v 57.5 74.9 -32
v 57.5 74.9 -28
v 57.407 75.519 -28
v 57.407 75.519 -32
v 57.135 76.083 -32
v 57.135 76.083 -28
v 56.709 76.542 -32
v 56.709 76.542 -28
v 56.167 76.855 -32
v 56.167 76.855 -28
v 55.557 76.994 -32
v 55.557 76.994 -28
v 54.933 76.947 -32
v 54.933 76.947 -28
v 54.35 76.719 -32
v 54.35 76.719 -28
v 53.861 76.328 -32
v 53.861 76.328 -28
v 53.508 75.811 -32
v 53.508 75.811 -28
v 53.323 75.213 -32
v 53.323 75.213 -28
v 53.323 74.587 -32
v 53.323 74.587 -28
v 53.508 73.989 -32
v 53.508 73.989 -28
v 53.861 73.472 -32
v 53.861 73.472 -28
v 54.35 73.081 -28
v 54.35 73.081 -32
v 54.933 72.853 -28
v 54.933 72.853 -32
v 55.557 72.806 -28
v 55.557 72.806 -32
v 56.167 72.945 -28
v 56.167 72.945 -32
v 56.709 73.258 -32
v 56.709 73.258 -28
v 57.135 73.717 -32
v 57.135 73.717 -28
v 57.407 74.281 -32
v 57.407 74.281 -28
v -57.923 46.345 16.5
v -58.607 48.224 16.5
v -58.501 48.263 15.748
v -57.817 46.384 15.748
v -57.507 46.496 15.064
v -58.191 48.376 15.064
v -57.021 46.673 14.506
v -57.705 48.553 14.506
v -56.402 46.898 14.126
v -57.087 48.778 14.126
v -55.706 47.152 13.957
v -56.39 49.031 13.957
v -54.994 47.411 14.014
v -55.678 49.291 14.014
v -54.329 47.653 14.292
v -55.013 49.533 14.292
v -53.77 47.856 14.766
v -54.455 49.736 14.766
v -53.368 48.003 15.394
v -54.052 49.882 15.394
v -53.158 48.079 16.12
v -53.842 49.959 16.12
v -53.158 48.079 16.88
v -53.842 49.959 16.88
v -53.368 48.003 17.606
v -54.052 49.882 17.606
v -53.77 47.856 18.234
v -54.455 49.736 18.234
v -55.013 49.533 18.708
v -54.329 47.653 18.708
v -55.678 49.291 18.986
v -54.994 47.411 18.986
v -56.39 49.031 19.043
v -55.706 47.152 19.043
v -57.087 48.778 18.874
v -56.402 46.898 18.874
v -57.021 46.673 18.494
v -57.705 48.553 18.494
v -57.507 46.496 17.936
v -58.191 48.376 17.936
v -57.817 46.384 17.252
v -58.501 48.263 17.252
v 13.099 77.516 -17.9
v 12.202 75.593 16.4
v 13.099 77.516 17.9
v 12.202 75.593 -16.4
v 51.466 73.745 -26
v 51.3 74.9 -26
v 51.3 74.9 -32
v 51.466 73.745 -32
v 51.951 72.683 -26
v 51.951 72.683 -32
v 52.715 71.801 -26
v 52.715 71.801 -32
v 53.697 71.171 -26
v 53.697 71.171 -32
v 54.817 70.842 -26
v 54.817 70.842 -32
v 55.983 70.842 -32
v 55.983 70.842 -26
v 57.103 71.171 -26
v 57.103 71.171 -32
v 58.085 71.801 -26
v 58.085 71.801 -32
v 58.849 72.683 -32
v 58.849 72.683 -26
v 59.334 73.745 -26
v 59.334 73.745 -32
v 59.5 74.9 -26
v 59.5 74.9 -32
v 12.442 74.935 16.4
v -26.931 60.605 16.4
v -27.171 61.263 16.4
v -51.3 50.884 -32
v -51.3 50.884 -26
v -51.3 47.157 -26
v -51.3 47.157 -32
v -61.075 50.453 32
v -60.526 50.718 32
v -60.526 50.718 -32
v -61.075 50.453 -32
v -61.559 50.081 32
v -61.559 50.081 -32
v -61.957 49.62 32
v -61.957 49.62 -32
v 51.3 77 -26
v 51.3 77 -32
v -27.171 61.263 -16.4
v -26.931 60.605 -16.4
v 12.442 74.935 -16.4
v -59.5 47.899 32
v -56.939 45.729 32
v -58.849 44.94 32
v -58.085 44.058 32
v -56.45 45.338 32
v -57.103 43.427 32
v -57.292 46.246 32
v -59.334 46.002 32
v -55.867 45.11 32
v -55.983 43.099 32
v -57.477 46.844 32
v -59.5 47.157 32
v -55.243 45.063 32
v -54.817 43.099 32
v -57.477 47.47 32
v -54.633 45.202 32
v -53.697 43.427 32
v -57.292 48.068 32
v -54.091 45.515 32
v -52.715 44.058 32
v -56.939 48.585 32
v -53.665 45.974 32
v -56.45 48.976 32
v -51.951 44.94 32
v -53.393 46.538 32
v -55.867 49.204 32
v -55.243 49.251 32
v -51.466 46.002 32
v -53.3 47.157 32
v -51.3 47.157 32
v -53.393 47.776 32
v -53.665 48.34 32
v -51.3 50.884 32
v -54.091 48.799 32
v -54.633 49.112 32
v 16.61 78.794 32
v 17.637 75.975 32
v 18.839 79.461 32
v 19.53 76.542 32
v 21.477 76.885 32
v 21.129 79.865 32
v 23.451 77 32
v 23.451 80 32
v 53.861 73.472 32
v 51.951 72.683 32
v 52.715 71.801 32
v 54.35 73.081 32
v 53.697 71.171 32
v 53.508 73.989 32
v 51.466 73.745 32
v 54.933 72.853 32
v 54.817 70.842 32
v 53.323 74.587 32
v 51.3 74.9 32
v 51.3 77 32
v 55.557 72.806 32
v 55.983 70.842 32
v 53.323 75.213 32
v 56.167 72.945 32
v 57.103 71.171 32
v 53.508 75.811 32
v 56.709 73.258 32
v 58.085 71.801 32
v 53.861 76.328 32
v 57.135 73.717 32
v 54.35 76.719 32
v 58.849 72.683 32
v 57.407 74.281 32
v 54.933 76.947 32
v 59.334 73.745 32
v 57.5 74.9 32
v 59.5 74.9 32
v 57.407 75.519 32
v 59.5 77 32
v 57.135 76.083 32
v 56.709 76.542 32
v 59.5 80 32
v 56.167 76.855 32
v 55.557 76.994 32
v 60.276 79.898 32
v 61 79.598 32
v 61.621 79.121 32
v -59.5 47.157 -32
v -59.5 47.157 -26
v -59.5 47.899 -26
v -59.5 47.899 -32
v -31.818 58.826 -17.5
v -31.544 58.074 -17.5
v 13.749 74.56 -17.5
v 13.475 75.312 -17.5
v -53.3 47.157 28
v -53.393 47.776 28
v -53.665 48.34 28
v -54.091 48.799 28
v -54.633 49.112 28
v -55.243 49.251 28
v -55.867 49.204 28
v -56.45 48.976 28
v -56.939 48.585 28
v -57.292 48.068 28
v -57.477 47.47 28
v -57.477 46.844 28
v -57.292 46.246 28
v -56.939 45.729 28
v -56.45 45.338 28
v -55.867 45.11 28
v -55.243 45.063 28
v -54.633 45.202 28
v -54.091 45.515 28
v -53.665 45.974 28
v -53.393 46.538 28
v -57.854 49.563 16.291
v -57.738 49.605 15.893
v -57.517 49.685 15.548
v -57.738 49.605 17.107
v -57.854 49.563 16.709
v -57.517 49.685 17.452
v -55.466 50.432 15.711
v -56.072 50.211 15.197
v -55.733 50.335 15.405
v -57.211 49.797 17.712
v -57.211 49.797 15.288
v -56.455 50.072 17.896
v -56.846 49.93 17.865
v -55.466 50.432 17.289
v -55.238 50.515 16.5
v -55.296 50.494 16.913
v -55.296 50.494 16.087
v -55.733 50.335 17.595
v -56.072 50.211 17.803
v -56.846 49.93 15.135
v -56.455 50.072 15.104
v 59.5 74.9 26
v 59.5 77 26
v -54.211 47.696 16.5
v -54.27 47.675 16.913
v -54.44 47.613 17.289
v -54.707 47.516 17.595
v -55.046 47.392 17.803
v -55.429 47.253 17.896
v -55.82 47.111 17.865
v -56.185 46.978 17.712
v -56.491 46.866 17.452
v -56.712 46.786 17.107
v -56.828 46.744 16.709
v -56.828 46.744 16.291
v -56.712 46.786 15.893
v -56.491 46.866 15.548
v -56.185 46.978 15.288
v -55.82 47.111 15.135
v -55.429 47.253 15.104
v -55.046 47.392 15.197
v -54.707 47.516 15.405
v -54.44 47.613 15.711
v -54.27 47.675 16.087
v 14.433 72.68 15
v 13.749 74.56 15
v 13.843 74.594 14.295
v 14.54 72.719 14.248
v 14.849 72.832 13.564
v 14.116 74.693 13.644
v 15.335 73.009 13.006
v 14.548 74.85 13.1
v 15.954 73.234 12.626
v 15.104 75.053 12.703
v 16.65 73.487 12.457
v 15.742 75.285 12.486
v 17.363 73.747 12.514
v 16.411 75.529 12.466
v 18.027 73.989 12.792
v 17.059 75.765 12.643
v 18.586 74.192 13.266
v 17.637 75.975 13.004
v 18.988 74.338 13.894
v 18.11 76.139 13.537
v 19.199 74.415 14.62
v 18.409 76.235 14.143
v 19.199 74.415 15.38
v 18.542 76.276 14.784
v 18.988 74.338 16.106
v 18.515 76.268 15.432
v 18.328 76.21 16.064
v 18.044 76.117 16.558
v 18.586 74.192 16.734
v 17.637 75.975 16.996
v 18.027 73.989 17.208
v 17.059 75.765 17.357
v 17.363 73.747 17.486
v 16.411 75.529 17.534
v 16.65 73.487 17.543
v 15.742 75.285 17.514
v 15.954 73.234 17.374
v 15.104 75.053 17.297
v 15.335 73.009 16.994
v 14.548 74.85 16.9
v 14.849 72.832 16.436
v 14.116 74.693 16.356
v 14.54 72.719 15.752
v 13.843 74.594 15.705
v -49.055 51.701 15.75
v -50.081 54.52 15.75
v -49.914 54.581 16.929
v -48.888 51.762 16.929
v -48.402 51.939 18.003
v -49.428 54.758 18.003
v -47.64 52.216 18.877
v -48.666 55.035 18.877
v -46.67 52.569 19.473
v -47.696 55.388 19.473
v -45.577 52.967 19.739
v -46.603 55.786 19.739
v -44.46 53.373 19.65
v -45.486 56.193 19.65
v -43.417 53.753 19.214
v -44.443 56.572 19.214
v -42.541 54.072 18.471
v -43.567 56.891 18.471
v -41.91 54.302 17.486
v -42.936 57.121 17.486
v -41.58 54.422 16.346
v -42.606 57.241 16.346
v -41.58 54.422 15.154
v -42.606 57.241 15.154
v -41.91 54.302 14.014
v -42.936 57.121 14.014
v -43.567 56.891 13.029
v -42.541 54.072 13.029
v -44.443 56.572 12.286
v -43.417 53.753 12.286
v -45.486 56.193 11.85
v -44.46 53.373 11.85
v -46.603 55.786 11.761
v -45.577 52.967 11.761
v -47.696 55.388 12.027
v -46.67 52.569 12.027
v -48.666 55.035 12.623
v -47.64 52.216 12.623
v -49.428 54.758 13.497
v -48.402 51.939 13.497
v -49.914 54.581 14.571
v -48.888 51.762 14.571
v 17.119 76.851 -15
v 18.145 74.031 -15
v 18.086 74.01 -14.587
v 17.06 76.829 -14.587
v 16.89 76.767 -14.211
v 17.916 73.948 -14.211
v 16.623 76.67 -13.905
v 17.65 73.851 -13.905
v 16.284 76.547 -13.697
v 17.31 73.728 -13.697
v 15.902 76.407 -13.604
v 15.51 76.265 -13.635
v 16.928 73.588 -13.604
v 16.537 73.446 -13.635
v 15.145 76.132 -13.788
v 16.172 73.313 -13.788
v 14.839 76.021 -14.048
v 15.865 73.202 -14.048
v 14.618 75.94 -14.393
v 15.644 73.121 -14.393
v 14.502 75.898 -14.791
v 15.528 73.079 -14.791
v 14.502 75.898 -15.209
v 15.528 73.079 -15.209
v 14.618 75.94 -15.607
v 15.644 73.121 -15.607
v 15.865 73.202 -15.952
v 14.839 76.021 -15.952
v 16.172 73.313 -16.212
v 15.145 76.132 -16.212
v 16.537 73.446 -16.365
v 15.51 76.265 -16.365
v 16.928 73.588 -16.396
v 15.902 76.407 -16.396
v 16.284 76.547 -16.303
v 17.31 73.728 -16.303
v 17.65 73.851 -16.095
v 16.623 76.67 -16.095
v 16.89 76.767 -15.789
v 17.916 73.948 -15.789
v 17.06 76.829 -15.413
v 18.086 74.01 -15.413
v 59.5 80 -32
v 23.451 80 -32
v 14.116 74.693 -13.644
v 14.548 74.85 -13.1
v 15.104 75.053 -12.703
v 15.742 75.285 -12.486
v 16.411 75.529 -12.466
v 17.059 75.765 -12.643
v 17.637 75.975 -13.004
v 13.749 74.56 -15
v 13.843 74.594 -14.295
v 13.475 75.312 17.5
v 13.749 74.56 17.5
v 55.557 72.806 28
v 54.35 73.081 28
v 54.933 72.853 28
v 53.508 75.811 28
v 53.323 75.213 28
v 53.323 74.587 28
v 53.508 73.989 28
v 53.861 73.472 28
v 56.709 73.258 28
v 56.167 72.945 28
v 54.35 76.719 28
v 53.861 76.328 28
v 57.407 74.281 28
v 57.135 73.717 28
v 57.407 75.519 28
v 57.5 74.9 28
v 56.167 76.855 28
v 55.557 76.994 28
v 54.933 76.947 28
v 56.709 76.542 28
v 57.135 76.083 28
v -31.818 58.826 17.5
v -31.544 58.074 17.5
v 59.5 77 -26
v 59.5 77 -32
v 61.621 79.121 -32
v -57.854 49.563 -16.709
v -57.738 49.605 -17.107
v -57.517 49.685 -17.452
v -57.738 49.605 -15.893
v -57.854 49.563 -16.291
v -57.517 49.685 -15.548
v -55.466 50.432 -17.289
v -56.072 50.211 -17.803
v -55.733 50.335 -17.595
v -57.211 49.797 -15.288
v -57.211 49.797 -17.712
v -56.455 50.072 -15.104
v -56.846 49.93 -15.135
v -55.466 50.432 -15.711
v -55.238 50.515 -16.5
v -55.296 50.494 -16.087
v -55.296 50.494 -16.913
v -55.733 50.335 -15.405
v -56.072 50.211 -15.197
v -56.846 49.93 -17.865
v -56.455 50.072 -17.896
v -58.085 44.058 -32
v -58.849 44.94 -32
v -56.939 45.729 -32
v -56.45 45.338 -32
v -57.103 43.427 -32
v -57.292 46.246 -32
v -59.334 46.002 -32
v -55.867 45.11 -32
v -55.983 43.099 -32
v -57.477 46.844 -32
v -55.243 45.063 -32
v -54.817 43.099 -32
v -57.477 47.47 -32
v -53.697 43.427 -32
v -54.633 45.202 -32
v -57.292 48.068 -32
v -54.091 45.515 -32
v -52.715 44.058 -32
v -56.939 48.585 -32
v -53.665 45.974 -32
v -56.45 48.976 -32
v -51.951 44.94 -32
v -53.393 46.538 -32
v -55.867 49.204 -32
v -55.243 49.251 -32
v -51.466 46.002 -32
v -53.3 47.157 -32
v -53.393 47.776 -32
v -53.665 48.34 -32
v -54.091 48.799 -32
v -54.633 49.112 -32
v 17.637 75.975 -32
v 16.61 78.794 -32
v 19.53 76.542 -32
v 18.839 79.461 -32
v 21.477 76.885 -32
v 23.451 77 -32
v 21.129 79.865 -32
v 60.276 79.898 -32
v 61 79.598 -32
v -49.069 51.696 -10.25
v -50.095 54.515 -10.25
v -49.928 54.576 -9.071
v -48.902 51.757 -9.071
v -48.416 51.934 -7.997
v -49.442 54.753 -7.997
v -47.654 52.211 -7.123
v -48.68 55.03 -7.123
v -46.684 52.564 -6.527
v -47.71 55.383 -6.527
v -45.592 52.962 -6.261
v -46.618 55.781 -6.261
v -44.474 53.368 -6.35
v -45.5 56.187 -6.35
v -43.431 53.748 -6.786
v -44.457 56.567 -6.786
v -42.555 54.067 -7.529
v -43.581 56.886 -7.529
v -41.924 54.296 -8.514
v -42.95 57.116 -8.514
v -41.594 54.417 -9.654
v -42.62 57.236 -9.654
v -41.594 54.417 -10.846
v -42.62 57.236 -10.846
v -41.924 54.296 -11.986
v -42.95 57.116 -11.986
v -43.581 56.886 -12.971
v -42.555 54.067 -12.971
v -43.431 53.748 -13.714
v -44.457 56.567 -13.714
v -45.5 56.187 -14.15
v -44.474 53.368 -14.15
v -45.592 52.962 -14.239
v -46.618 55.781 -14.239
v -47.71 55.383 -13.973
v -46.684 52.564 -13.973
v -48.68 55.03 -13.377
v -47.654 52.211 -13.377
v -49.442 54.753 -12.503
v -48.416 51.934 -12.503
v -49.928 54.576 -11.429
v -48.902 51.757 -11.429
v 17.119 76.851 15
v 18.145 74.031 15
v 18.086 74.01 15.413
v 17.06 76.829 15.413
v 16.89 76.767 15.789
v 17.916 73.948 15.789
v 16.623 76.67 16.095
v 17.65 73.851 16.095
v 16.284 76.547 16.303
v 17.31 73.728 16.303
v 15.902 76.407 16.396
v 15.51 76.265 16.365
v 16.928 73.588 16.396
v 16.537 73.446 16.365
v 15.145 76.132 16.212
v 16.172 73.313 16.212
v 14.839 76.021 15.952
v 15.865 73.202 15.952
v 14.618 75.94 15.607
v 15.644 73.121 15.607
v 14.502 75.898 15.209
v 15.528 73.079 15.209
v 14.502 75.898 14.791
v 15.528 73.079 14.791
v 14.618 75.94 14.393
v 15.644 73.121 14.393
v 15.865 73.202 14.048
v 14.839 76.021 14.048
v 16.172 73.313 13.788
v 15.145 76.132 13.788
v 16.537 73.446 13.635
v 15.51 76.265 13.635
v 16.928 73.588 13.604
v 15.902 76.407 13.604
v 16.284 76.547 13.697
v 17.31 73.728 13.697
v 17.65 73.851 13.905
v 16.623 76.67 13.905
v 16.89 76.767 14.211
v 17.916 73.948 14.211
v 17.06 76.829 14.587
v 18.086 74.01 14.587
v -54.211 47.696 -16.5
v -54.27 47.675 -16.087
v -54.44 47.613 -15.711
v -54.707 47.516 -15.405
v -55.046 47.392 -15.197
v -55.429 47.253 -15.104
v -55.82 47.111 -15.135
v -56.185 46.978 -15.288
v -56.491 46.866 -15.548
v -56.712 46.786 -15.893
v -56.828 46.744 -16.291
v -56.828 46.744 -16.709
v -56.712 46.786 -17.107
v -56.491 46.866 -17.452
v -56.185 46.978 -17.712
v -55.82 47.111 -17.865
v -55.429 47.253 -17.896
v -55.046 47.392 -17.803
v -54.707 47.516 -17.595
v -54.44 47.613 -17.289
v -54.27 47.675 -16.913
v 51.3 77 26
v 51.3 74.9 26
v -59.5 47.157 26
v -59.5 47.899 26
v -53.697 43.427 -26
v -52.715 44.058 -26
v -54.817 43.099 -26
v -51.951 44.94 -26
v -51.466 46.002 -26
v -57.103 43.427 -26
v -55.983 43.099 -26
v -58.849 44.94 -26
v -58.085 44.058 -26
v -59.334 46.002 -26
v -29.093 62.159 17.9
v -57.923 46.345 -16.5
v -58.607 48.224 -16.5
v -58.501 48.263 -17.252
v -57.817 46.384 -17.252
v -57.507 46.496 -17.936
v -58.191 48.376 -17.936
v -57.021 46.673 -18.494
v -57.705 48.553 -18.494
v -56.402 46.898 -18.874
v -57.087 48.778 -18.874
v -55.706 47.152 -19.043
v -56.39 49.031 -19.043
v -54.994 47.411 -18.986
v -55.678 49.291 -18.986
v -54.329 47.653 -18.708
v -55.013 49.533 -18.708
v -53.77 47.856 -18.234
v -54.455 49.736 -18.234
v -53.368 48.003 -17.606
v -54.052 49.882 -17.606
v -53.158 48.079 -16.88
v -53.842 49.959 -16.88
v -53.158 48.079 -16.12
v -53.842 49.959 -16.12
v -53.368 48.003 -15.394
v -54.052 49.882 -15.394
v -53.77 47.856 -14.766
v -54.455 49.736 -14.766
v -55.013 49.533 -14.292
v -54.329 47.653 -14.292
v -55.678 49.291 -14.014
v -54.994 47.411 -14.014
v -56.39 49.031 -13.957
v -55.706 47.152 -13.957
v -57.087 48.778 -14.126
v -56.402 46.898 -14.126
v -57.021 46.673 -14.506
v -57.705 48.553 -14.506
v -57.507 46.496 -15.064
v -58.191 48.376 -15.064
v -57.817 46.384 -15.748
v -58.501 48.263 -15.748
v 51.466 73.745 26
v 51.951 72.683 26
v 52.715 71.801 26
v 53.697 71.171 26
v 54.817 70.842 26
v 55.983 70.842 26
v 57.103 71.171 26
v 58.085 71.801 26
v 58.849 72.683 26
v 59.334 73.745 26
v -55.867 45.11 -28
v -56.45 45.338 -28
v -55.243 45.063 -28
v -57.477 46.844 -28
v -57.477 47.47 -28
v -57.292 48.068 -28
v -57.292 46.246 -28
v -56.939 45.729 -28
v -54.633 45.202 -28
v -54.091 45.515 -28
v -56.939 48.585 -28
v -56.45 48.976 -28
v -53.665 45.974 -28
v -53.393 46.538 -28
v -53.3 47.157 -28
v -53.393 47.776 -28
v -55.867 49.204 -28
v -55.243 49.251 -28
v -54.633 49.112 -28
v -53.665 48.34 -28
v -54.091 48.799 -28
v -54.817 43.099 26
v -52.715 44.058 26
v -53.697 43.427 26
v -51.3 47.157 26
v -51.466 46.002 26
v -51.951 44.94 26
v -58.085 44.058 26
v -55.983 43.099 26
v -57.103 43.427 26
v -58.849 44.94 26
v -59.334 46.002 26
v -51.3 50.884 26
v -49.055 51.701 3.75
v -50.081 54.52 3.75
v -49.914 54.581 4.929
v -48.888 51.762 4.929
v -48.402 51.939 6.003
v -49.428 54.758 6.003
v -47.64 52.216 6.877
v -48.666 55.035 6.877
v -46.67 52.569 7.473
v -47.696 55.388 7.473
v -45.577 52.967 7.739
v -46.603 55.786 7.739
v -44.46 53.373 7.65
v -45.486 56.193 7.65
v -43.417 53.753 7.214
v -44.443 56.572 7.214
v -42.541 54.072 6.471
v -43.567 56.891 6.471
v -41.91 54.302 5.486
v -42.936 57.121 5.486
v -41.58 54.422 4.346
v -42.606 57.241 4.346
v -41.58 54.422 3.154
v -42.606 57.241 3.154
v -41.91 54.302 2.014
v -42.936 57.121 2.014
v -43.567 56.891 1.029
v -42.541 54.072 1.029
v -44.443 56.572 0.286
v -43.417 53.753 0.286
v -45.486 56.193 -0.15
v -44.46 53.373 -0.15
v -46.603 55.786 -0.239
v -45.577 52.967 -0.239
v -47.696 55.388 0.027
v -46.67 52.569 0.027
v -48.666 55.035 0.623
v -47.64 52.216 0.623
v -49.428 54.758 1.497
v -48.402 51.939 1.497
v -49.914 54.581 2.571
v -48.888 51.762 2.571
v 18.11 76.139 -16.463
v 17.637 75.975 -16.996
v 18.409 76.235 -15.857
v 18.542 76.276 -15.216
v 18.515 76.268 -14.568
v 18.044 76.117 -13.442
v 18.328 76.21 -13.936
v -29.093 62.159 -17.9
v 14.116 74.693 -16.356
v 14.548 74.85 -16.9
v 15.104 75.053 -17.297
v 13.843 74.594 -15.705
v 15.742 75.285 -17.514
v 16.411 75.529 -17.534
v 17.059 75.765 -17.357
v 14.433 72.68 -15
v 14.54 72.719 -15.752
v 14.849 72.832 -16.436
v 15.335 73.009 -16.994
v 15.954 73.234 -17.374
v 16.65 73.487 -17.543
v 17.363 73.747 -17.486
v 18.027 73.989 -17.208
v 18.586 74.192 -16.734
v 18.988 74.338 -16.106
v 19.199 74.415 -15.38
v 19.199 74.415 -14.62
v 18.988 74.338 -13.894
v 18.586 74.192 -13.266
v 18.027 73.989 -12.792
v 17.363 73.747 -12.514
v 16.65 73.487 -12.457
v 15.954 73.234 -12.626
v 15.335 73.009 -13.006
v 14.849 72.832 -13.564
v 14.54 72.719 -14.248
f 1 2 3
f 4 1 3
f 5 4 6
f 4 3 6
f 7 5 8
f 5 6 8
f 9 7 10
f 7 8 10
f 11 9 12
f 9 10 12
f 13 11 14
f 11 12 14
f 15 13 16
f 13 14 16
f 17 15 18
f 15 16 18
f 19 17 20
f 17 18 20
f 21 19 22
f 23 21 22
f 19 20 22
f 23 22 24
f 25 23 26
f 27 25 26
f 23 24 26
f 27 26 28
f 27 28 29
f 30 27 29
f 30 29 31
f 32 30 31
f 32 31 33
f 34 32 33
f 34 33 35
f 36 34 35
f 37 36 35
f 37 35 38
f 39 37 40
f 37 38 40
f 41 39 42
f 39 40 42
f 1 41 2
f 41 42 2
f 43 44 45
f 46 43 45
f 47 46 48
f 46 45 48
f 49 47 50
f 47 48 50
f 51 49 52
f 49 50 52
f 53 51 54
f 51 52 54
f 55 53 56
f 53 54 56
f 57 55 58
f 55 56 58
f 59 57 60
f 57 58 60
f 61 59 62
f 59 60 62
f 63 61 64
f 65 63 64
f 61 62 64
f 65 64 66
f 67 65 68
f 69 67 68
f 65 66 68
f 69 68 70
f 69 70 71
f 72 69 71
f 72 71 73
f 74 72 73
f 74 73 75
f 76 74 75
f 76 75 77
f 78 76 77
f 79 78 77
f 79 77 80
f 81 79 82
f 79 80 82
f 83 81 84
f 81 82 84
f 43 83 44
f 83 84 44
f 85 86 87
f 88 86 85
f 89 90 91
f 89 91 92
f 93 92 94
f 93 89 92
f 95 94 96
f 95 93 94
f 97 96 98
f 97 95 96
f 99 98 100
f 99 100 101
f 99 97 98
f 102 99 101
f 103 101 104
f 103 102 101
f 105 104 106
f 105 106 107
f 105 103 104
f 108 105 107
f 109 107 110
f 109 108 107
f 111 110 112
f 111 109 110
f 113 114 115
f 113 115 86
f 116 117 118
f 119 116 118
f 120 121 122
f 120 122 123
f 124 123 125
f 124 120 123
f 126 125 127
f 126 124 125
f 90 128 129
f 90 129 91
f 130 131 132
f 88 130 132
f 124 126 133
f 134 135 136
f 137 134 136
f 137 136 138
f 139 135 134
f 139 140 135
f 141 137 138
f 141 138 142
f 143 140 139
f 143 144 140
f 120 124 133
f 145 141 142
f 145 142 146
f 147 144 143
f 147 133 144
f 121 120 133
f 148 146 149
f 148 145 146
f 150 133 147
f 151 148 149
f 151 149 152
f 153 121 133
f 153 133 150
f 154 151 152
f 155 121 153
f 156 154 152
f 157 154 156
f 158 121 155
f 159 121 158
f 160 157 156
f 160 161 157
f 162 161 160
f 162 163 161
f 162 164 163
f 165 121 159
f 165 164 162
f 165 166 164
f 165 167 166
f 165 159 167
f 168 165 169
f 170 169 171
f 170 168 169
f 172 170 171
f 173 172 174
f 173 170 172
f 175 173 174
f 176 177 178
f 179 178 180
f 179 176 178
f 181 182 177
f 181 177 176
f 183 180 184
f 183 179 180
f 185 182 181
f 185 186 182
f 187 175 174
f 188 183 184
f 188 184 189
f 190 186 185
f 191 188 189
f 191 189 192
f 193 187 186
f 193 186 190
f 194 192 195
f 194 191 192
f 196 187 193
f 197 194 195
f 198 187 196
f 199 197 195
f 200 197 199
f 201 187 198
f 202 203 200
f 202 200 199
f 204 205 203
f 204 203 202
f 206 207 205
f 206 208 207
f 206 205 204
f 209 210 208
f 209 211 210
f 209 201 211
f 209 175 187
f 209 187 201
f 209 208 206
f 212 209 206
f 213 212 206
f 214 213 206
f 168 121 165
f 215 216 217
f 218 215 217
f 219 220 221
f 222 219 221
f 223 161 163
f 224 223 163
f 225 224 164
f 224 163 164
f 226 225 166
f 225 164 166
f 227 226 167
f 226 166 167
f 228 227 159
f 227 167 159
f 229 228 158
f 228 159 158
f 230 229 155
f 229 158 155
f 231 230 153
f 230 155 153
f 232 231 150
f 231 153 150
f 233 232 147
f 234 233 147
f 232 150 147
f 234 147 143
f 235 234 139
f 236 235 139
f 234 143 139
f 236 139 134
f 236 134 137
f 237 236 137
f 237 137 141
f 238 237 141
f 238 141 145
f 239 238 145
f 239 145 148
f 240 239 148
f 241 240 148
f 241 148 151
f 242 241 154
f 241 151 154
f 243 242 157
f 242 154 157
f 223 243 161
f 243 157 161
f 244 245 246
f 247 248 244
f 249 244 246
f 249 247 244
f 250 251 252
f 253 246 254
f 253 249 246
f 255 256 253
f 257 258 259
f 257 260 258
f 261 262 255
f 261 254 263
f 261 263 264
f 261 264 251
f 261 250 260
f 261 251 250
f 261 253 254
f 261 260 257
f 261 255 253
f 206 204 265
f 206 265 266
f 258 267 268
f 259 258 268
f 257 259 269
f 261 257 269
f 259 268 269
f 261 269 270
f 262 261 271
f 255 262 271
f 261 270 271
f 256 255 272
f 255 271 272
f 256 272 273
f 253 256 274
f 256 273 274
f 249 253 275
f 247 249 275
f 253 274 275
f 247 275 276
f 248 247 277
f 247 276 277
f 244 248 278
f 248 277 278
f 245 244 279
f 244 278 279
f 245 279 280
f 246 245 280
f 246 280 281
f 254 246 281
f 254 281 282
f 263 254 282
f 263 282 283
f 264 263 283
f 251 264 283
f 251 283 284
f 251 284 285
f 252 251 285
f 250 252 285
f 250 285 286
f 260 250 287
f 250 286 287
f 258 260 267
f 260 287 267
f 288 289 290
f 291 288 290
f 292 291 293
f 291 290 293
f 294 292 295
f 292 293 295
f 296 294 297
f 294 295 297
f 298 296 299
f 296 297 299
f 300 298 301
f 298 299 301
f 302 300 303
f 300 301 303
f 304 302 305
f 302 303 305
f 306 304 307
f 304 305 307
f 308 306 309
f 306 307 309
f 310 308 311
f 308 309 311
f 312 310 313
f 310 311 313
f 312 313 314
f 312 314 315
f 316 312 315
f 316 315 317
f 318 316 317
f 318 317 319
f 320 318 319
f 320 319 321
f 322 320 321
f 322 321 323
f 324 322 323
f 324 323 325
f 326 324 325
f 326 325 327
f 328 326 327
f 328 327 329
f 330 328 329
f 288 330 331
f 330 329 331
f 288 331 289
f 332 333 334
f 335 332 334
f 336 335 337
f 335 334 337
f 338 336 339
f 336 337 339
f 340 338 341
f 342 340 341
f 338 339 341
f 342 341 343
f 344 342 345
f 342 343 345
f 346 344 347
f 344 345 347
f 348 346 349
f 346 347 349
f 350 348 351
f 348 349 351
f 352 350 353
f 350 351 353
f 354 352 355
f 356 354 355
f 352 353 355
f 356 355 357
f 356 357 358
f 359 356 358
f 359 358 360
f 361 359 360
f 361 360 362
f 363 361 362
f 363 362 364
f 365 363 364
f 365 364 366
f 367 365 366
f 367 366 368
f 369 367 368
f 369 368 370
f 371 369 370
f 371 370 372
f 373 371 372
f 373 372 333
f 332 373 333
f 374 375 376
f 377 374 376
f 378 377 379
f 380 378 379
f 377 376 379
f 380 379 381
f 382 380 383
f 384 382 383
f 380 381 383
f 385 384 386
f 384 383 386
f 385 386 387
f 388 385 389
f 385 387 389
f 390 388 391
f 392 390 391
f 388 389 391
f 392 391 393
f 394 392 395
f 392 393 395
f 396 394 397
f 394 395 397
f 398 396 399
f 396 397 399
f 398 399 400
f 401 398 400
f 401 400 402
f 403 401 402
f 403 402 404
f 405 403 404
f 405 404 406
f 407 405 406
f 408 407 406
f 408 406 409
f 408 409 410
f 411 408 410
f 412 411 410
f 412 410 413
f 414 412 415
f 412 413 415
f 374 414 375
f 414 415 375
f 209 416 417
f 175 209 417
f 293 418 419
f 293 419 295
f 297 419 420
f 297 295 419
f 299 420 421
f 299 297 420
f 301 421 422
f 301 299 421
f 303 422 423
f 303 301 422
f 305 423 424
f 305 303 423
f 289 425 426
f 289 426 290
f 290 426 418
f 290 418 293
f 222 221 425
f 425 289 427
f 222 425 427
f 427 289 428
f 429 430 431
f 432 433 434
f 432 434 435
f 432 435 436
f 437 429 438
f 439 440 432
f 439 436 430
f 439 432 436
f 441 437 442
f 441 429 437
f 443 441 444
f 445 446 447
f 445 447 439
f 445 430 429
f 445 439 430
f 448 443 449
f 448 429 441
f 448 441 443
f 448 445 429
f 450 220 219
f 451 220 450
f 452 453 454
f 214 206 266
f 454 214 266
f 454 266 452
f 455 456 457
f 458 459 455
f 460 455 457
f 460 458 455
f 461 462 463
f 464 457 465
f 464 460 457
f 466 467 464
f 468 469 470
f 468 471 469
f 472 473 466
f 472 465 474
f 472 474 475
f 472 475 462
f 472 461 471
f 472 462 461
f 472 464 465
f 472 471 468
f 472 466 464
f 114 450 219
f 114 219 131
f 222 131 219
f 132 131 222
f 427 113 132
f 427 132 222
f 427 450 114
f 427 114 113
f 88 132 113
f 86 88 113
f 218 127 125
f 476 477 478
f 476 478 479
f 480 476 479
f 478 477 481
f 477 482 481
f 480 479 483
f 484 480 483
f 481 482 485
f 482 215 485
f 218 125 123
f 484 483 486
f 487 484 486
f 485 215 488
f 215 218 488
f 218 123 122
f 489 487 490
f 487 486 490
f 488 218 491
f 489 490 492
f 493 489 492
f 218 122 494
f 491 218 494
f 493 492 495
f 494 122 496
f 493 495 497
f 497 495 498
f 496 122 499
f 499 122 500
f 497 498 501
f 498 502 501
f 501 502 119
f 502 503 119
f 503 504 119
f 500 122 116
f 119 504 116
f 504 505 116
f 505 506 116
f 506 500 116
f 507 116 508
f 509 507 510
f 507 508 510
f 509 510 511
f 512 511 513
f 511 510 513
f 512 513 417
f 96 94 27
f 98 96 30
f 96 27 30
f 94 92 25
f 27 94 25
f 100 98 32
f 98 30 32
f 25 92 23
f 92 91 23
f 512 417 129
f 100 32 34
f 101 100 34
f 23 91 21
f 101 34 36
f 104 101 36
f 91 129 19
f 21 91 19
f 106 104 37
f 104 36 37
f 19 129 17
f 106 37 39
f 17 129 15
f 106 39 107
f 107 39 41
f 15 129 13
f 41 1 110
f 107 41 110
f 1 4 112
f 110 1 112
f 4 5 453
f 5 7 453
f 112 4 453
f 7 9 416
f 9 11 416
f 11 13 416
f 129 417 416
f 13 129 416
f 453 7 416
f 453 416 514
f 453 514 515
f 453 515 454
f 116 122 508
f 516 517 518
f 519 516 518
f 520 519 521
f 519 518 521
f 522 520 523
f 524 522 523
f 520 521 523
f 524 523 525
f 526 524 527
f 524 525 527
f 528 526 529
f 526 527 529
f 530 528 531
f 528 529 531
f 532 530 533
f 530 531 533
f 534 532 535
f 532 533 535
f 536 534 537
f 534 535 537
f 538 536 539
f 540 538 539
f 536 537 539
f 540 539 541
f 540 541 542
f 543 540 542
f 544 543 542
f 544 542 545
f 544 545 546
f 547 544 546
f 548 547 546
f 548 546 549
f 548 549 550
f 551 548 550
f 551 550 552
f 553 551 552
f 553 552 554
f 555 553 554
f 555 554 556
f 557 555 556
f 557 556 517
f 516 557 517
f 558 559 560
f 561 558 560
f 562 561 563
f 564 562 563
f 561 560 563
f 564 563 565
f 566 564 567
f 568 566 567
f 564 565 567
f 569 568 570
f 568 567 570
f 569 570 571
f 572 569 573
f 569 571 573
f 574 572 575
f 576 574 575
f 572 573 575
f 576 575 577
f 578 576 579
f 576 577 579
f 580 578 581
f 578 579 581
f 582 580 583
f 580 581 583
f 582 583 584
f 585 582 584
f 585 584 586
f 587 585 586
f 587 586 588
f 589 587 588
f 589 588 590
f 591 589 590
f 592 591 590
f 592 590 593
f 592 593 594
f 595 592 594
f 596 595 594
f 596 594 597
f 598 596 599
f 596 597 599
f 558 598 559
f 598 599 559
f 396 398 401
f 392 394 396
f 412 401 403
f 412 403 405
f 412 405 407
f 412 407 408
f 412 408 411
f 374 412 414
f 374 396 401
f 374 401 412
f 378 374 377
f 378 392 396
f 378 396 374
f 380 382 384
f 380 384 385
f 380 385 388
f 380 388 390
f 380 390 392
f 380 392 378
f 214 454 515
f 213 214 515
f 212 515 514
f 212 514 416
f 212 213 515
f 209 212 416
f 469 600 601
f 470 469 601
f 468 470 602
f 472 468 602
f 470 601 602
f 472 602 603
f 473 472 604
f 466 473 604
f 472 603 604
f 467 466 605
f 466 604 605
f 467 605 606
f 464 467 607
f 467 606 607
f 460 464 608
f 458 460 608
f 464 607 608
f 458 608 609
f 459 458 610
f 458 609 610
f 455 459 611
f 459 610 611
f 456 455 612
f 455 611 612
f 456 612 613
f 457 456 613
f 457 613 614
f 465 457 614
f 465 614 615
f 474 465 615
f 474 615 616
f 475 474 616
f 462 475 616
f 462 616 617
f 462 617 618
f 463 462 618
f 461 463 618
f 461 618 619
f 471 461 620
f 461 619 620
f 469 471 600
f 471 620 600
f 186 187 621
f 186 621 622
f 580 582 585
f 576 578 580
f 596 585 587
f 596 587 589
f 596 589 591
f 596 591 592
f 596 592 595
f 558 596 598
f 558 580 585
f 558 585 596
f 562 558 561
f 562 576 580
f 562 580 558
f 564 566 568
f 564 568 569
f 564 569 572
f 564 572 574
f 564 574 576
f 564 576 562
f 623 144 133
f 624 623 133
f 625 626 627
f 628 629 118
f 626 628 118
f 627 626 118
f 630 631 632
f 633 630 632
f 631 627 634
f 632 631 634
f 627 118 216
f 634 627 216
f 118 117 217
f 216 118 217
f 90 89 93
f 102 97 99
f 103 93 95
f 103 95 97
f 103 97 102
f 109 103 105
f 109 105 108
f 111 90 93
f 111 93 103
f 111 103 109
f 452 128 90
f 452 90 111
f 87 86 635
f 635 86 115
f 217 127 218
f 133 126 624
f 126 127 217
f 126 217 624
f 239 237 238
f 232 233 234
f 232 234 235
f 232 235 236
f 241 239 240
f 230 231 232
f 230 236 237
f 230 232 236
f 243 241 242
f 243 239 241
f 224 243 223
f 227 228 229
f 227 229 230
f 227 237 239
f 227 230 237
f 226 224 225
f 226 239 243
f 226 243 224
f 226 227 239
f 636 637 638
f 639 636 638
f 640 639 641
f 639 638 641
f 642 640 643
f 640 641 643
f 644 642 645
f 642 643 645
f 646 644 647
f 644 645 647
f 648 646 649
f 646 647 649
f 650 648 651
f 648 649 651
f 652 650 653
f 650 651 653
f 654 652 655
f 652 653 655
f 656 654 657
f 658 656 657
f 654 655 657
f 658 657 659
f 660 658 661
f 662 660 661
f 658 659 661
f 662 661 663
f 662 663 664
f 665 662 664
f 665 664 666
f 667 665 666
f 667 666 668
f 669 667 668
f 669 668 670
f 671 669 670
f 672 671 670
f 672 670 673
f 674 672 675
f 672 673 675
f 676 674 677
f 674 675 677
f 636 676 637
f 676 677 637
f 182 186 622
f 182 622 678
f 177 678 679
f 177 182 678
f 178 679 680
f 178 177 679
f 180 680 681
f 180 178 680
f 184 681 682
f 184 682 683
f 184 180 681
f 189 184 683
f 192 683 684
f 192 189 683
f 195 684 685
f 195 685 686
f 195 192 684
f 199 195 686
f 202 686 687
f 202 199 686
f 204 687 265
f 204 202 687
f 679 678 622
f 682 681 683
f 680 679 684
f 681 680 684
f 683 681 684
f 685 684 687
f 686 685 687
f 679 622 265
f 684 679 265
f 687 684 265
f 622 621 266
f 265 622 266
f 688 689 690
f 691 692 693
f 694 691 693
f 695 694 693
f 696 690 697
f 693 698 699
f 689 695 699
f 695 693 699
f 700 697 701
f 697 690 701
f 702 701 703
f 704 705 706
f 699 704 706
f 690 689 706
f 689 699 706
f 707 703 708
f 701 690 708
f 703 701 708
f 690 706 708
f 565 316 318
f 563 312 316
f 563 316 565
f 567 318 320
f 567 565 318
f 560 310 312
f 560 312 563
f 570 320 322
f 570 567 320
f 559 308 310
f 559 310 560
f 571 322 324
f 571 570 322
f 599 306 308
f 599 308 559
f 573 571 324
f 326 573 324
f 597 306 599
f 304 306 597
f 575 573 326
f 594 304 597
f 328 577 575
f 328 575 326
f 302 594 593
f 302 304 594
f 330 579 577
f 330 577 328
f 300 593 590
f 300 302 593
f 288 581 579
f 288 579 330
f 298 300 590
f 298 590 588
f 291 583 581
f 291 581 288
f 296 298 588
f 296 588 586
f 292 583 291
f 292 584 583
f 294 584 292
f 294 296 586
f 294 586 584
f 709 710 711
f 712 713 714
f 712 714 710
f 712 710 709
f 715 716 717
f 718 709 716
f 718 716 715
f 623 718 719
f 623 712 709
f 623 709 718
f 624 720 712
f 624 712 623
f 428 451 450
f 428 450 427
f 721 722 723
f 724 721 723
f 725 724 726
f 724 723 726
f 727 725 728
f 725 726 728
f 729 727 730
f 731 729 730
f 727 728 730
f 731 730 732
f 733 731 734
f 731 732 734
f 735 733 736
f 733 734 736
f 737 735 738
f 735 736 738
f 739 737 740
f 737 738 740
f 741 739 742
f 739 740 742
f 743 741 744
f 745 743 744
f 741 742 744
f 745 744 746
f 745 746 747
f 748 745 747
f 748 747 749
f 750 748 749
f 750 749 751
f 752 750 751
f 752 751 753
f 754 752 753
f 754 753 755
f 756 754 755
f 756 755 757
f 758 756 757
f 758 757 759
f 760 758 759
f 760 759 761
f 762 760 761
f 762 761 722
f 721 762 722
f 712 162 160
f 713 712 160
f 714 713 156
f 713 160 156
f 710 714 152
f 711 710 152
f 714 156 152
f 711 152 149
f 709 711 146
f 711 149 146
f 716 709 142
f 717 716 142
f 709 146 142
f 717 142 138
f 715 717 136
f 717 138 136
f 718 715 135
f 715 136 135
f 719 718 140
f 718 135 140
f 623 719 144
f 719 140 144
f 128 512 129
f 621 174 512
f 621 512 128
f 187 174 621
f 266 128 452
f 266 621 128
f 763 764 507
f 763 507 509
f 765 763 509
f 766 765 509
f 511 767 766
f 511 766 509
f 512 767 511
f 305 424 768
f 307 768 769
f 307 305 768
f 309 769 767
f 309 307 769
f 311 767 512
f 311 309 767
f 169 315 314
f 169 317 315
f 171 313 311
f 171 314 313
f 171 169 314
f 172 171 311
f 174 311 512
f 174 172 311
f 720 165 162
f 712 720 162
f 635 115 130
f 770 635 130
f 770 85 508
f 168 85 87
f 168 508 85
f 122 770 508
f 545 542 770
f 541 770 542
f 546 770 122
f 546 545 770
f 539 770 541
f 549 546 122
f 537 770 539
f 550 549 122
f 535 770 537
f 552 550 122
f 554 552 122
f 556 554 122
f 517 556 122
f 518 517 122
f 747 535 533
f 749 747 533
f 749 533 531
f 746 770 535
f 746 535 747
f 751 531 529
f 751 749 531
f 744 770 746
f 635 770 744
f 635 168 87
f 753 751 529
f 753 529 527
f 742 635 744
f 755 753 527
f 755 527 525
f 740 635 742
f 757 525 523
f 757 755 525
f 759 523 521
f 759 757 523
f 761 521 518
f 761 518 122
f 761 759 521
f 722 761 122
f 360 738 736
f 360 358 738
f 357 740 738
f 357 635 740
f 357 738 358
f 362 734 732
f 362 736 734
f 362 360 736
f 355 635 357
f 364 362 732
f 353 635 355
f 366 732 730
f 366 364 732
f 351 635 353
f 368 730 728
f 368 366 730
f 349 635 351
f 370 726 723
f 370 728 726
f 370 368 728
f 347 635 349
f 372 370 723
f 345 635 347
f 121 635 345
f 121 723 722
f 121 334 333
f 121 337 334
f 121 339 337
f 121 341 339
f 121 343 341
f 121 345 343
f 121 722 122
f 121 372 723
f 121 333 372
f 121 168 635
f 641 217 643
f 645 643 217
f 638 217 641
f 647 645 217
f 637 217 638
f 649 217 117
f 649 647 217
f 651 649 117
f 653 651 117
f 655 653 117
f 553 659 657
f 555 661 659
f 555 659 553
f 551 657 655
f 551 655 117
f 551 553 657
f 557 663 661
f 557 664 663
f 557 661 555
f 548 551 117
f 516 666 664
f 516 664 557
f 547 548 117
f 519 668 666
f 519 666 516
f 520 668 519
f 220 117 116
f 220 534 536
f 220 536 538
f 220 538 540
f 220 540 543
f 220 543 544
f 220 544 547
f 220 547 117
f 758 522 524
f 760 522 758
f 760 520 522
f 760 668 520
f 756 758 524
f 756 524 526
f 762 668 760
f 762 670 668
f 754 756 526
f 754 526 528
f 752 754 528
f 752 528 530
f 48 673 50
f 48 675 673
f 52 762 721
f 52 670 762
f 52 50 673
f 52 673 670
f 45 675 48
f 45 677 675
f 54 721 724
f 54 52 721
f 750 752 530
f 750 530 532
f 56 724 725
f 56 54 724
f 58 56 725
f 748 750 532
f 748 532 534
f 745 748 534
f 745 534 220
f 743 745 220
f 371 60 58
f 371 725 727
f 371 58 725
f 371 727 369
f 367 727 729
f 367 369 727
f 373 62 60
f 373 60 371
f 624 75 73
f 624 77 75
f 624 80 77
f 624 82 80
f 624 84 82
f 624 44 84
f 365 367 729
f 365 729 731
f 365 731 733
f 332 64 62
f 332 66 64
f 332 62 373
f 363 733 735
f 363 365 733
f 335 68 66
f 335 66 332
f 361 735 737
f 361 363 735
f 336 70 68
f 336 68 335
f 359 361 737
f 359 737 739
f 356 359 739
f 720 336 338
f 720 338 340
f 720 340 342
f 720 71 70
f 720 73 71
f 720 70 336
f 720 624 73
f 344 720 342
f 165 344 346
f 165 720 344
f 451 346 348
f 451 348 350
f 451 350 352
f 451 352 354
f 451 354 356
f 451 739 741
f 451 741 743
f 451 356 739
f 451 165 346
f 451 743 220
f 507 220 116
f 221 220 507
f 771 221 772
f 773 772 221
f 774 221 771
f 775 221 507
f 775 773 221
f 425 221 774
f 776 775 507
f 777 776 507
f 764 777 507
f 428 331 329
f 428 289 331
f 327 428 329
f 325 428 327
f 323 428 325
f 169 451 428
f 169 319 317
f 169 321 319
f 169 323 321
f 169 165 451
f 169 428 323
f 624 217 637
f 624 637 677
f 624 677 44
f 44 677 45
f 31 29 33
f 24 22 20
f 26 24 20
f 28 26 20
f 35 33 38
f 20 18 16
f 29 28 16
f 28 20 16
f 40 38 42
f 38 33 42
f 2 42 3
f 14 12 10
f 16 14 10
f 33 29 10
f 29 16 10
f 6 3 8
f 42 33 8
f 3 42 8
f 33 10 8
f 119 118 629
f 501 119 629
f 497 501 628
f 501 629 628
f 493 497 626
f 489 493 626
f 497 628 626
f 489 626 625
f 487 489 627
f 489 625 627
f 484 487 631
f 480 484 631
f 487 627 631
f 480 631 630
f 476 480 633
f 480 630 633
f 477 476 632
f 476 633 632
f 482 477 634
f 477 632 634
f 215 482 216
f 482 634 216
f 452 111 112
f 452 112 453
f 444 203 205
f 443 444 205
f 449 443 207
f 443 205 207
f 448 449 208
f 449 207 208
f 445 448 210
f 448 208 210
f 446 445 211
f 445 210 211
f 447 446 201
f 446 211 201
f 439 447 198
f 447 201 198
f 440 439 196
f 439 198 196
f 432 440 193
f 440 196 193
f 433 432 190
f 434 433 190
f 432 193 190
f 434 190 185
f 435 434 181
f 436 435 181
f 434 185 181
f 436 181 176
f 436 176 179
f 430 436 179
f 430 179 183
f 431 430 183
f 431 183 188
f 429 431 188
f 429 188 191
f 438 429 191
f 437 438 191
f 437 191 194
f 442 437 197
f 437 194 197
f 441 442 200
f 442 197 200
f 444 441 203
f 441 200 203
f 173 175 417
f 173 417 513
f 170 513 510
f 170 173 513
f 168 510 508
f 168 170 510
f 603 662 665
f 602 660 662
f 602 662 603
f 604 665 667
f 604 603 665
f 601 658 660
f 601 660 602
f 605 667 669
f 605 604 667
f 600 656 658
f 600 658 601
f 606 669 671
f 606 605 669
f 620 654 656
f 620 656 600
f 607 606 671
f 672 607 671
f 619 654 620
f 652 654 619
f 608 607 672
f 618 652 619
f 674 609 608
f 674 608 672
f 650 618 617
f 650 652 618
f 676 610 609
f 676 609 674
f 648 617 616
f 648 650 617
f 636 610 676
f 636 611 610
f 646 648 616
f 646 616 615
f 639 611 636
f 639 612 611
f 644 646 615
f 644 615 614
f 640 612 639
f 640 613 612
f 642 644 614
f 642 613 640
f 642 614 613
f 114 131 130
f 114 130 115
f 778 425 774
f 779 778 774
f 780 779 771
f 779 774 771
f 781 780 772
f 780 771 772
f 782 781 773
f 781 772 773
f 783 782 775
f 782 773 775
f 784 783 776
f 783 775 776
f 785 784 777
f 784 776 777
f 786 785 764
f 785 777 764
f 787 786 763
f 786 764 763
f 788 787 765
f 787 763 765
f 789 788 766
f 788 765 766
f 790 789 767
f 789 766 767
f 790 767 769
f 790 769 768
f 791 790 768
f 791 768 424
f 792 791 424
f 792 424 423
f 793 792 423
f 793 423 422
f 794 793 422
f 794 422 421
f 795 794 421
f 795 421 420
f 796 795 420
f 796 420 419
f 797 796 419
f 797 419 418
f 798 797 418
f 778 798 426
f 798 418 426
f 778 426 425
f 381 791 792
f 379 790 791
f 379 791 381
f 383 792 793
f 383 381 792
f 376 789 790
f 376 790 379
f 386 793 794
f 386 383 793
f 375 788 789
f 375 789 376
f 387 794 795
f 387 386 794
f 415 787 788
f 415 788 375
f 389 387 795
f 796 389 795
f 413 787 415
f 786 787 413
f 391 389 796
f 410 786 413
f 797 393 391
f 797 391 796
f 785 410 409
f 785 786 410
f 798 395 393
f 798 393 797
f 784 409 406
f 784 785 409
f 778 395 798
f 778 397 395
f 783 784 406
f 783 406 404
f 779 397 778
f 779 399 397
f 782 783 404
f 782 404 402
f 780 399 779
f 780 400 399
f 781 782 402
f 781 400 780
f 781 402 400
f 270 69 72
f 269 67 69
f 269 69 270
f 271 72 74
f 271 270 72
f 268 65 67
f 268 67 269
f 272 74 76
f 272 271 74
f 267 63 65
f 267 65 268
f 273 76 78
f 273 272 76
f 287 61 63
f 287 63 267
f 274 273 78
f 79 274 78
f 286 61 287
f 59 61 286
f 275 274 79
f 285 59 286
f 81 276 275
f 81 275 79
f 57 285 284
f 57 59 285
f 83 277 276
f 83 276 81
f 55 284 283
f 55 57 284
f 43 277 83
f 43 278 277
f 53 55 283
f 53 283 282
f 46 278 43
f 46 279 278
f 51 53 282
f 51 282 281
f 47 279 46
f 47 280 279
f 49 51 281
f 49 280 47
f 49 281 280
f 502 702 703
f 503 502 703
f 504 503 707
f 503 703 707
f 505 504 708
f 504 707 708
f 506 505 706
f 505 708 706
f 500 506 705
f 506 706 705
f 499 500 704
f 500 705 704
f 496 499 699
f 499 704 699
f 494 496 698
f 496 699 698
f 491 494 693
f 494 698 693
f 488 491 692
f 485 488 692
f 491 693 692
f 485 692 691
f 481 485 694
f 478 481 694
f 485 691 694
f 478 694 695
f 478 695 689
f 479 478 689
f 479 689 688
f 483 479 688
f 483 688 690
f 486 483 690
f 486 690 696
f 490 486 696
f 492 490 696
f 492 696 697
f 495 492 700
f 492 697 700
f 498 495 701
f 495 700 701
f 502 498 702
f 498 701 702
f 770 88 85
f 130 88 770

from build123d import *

# Parameters (mm, degrees)
EXTRUDE_1_DEPTH     = 32
EXTRUDE_START       = 32
SKETCH_2_R          = 2.1
EXTRUDE_2_DEPTH     = 6
EXTRUDE_START_2     = -26
SKETCH_2_3_R        = 2.1
EXTRUDE_3_DEPTH     = 6
CUT_EXTRUDE_START   = 32
SKETCH_2_4_R        = 2.1
CUT_EXTRUDE_1_DEPTH = 4
CUT_EXTRUDE_START_2 = -28
SKETCH_2_5_R        = 2.1
CUT_EXTRUDE_2_DEPTH = 4
SKETCH_3_W          = 48.2
SKETCH_3_H          = 35
CUT_EXTRUDE_3_DEPTH = 0.8
SKETCH_4_W          = 41.9
SKETCH_4_H          = 32.8
CUT_EXTRUDE_4_DEPTH = 92.767243652
SKETCH_7_R          = 4
CUT_EXTRUDE_5_DEPTH = 10
SKETCH_8_R          = 2.55
EXTRUDE_4_DEPTH     = 2
SKETCH_9_R          = 1.4
CUT_EXTRUDE_6_DEPTH = 3
CHAMFER_1_SIZE      = 1.5


with BuildPart() as part:
    # Эскиз1 → Бобышка-Вытянуть1 (new, symmetric)
    with BuildSketch(Plane.XY):
        with BuildLine():
            Line((59.5, 80), (23.450862198, 80))
            ThreePointArc((23.450862198, 80), (19.977898644, 79.69615506), (16.610459331, 78.793852416))
            Line((16.610459331, 78.793852416), (-60.52606043, 50.718455248))
            ThreePointArc((-60.52606043, 50.718455248), (-61.326284287, 50.279437406), (-61.957456133, 49.620106694))
            Line((-61.957456133, 49.620106694), (-59.5, 47.899377385))
            Line((-59.5, 47.899377385), (17.636519761, 75.974774553))
            ThreePointArc((17.636519761, 75.974774553), (20.498843177, 76.741731801), (23.450862198, 77))
            Line((23.450862198, 77), (59.5, 77))
            Line((59.5, 77), (61.621320344, 79.121320344))
            ThreePointArc((61.621320344, 79.121320344), (60.648050297, 79.771638598), (59.5, 80))
        make_face()
    extrude(amount=EXTRUDE_1_DEPTH, both=True)

    # Эскиз2 → Бобышка-Вытянуть2 (add)
    # profile 1 of 4: a face of its own
    with BuildSketch(Plane.XY.offset(EXTRUDE_START)):
        with BuildLine():
            Line((51.3, 80), (51.3, 74.9))
            ThreePointArc((51.3, 74.9), (55.4, 70.8), (59.5, 74.9))
            Line((59.5, 74.9), (59.5, 80))
            Line((59.5, 80), (51.3, 80))
        make_face()
        with Locations((55.4, 74.9)):
            Circle(SKETCH_2_R, mode=Mode.SUBTRACT)
    # profile 2 of 4: a face of its own
    with BuildSketch(Plane.XY.offset(EXTRUDE_START)):
        with Locations((55.4, 74.9)):
            Circle(SKETCH_2_R)
    # profile 3 of 4: a face of its own
    with BuildSketch(Plane.XY.offset(EXTRUDE_START)):
        with BuildLine():
            ThreePointArc((-51.3, 47.156882024), (-55.4, 43.056882024), (-59.5, 47.156882024))
            Line((-59.5, 47.156882024), (-59.5, 51.091910703))
            Line((-59.5, 51.091910703), (-51.3, 54.076466624))
            Line((-51.3, 54.076466624), (-51.3, 47.156882024))
        make_face()
        with Locations((-55.4, 47.156882024)):
            Circle(SKETCH_2_R, mode=Mode.SUBTRACT)
    # profile 4 of 4: a face of its own
    with BuildSketch(Plane.XY.offset(EXTRUDE_START)):
        with Locations((-55.4, 47.156882024)):
            Circle(SKETCH_2_R)
    extrude(amount=-EXTRUDE_2_DEPTH)

    # Эскиз2<3> → Бобышка-Вытянуть3 (add)
    # profile 1 of 4: a face of its own
    with BuildSketch(Plane.XY.offset(EXTRUDE_START_2)):
        with BuildLine():
            Line((51.3, 80), (51.3, 74.9))
            ThreePointArc((51.3, 74.9), (55.4, 70.8), (59.5, 74.9))
            Line((59.5, 74.9), (59.5, 80))
            Line((59.5, 80), (51.3, 80))
        make_face()
        with Locations((55.4, 74.9)):
            Circle(SKETCH_2_3_R, mode=Mode.SUBTRACT)
    # profile 2 of 4: a face of its own
    with BuildSketch(Plane.XY.offset(EXTRUDE_START_2)):
        with Locations((55.4, 74.9)):
            Circle(SKETCH_2_3_R)
    # profile 3 of 4: a face of its own
    with BuildSketch(Plane.XY.offset(EXTRUDE_START_2)):
        with BuildLine():
            ThreePointArc((-51.3, 47.156882024), (-55.4, 43.056882024), (-59.5, 47.156882024))
            Line((-59.5, 47.156882024), (-59.5, 51.091910703))
            Line((-59.5, 51.091910703), (-51.3, 54.076466624))
            Line((-51.3, 54.076466624), (-51.3, 47.156882024))
        make_face()
        with Locations((-55.4, 47.156882024)):
            Circle(SKETCH_2_3_R, mode=Mode.SUBTRACT)
    # profile 4 of 4: a face of its own
    with BuildSketch(Plane.XY.offset(EXTRUDE_START_2)):
        with Locations((-55.4, 47.156882024)):
            Circle(SKETCH_2_3_R)
    extrude(amount=-EXTRUDE_3_DEPTH)

    # Эскиз2<4> → Вырез-Вытянуть1 (cut)
    with BuildSketch(Plane.XY.offset(CUT_EXTRUDE_START)):
        with Locations((55.4, 74.9)):
            Circle(SKETCH_2_4_R)
        with Locations((-55.4, 47.156882024)):
            Circle(SKETCH_2_4_R)
    extrude(amount=-CUT_EXTRUDE_1_DEPTH, mode=Mode.SUBTRACT)

    # Эскиз2<5> → Вырез-Вытянуть2 (cut)
    with BuildSketch(Plane.XY.offset(CUT_EXTRUDE_START_2)):
        with Locations((55.4, 74.9)):
            Circle(SKETCH_2_5_R)
        with Locations((-55.4, 47.156882024)):
            Circle(SKETCH_2_5_R)
    extrude(amount=-CUT_EXTRUDE_2_DEPTH, mode=Mode.SUBTRACT)

    # Эскиз3 → Вырез-Вытянуть3 (cut)
    with BuildSketch(Plane(origin=(-22.354740965, 61.419146018, 0), x_dir=(0.9396926207859082, 0.3420201433256692, 0), z_dir=(0.3420201433256692, -0.9396926207859082, 0))):
        with Locations((14.320840982, 0)):
            Rectangle(SKETCH_3_W, SKETCH_3_H)
    extrude(amount=-CUT_EXTRUDE_3_DEPTH, mode=Mode.SUBTRACT)

    # Эскиз4 → Вырез-Вытянуть4 (cut, through all)
    with BuildSketch(Plane(origin=(-22.354740965, 61.419146018, 0), x_dir=(0.9396926207859082, 0.3420201433256692, 0), z_dir=(0.3420201433256692, -0.9396926207859082, 0))):
        with Locations((16.370840982, 0)):
            Rectangle(SKETCH_4_W, SKETCH_4_H)
    extrude(amount=-CUT_EXTRUDE_4_DEPTH, mode=Mode.SUBTRACT)

    # Эскиз7 → Вырез-Вытянуть5 (cut)
    with BuildSketch(Plane(origin=(-23.380801395, 64.238223881, 0), x_dir=(0.9396926207859081, 0.34202014332566955, 0), z_dir=(-0.34202014332566955, 0.9396926207859082, 0))):
        with Locations(Location((-24.429159018, 10.25, 0), (0, 0, 180))):
            Circle(SKETCH_7_R)
        with Locations(Location((-24.414159018, -3.75, 0), (0, 0, 180))):
            Circle(SKETCH_7_R)
        with Locations(Location((-24.414159018, -15.75, 0), (0, 0, 180))):
            Circle(SKETCH_7_R)
    extrude(amount=-CUT_EXTRUDE_5_DEPTH, mode=Mode.SUBTRACT)

    # Эскиз8 → Бобышка-Вытянуть4 (add)
    with BuildSketch(Plane(origin=(-22.354740965, 61.419146018, 0), x_dir=(0.9396926207859081, 0.3420201433256697, 0), z_dir=(0.34202014332566966, -0.939692620785908, 0))):
        with Locations(Location((40.970840982, 15, 0), (0, 0, 180))):
            Circle(SKETCH_8_R)
        with Locations(Location((40.970840982, -15, 0), (0, 0, 180))):
            Circle(SKETCH_8_R)
        with Locations(Location((-36.029159018, -16.5, 0), (0, 0, 180))):
            Circle(SKETCH_8_R)
        with Locations(Location((-36.029159018, 16.5, 0), (0, 0, 180))):
            Circle(SKETCH_8_R)
    extrude(amount=EXTRUDE_4_DEPTH)

    # Эскиз9 → Вырез-Вытянуть6 (cut)
    with BuildSketch(Plane(origin=(-21.670700678, 59.539760777, 0), x_dir=(0.9396926207859104, 0.34202014332566316, 0), z_dir=(0.34202014332566316, -0.9396926207859104, 0))):
        with Locations((40.970840982, -15)):
            Circle(SKETCH_9_R)
        with Locations((40.970840982, 15)):
            Circle(SKETCH_9_R)
        with Locations((-36.029159018, -16.5)):
            Circle(SKETCH_9_R)
        with Locations((-36.029159018, 16.5)):
            Circle(SKETCH_9_R)
    extrude(amount=-CUT_EXTRUDE_6_DEPTH, mode=Mode.SUBTRACT)

    # Фаска1
    chamfer_1_edges = [part.edges().sort_by_distance(p)[0] for p in [
        (-27.683803334, 62.672059257, 0),
        (-7.997242928, 69.83738126, 16.4),
        (11.689317477, 77.002703262, 0),
        (-7.997242928, 69.83738126, -16.4),
    ]]
    chamfer(chamfer_1_edges, length=CHAMFER_1_SIZE)


solid = part.part
